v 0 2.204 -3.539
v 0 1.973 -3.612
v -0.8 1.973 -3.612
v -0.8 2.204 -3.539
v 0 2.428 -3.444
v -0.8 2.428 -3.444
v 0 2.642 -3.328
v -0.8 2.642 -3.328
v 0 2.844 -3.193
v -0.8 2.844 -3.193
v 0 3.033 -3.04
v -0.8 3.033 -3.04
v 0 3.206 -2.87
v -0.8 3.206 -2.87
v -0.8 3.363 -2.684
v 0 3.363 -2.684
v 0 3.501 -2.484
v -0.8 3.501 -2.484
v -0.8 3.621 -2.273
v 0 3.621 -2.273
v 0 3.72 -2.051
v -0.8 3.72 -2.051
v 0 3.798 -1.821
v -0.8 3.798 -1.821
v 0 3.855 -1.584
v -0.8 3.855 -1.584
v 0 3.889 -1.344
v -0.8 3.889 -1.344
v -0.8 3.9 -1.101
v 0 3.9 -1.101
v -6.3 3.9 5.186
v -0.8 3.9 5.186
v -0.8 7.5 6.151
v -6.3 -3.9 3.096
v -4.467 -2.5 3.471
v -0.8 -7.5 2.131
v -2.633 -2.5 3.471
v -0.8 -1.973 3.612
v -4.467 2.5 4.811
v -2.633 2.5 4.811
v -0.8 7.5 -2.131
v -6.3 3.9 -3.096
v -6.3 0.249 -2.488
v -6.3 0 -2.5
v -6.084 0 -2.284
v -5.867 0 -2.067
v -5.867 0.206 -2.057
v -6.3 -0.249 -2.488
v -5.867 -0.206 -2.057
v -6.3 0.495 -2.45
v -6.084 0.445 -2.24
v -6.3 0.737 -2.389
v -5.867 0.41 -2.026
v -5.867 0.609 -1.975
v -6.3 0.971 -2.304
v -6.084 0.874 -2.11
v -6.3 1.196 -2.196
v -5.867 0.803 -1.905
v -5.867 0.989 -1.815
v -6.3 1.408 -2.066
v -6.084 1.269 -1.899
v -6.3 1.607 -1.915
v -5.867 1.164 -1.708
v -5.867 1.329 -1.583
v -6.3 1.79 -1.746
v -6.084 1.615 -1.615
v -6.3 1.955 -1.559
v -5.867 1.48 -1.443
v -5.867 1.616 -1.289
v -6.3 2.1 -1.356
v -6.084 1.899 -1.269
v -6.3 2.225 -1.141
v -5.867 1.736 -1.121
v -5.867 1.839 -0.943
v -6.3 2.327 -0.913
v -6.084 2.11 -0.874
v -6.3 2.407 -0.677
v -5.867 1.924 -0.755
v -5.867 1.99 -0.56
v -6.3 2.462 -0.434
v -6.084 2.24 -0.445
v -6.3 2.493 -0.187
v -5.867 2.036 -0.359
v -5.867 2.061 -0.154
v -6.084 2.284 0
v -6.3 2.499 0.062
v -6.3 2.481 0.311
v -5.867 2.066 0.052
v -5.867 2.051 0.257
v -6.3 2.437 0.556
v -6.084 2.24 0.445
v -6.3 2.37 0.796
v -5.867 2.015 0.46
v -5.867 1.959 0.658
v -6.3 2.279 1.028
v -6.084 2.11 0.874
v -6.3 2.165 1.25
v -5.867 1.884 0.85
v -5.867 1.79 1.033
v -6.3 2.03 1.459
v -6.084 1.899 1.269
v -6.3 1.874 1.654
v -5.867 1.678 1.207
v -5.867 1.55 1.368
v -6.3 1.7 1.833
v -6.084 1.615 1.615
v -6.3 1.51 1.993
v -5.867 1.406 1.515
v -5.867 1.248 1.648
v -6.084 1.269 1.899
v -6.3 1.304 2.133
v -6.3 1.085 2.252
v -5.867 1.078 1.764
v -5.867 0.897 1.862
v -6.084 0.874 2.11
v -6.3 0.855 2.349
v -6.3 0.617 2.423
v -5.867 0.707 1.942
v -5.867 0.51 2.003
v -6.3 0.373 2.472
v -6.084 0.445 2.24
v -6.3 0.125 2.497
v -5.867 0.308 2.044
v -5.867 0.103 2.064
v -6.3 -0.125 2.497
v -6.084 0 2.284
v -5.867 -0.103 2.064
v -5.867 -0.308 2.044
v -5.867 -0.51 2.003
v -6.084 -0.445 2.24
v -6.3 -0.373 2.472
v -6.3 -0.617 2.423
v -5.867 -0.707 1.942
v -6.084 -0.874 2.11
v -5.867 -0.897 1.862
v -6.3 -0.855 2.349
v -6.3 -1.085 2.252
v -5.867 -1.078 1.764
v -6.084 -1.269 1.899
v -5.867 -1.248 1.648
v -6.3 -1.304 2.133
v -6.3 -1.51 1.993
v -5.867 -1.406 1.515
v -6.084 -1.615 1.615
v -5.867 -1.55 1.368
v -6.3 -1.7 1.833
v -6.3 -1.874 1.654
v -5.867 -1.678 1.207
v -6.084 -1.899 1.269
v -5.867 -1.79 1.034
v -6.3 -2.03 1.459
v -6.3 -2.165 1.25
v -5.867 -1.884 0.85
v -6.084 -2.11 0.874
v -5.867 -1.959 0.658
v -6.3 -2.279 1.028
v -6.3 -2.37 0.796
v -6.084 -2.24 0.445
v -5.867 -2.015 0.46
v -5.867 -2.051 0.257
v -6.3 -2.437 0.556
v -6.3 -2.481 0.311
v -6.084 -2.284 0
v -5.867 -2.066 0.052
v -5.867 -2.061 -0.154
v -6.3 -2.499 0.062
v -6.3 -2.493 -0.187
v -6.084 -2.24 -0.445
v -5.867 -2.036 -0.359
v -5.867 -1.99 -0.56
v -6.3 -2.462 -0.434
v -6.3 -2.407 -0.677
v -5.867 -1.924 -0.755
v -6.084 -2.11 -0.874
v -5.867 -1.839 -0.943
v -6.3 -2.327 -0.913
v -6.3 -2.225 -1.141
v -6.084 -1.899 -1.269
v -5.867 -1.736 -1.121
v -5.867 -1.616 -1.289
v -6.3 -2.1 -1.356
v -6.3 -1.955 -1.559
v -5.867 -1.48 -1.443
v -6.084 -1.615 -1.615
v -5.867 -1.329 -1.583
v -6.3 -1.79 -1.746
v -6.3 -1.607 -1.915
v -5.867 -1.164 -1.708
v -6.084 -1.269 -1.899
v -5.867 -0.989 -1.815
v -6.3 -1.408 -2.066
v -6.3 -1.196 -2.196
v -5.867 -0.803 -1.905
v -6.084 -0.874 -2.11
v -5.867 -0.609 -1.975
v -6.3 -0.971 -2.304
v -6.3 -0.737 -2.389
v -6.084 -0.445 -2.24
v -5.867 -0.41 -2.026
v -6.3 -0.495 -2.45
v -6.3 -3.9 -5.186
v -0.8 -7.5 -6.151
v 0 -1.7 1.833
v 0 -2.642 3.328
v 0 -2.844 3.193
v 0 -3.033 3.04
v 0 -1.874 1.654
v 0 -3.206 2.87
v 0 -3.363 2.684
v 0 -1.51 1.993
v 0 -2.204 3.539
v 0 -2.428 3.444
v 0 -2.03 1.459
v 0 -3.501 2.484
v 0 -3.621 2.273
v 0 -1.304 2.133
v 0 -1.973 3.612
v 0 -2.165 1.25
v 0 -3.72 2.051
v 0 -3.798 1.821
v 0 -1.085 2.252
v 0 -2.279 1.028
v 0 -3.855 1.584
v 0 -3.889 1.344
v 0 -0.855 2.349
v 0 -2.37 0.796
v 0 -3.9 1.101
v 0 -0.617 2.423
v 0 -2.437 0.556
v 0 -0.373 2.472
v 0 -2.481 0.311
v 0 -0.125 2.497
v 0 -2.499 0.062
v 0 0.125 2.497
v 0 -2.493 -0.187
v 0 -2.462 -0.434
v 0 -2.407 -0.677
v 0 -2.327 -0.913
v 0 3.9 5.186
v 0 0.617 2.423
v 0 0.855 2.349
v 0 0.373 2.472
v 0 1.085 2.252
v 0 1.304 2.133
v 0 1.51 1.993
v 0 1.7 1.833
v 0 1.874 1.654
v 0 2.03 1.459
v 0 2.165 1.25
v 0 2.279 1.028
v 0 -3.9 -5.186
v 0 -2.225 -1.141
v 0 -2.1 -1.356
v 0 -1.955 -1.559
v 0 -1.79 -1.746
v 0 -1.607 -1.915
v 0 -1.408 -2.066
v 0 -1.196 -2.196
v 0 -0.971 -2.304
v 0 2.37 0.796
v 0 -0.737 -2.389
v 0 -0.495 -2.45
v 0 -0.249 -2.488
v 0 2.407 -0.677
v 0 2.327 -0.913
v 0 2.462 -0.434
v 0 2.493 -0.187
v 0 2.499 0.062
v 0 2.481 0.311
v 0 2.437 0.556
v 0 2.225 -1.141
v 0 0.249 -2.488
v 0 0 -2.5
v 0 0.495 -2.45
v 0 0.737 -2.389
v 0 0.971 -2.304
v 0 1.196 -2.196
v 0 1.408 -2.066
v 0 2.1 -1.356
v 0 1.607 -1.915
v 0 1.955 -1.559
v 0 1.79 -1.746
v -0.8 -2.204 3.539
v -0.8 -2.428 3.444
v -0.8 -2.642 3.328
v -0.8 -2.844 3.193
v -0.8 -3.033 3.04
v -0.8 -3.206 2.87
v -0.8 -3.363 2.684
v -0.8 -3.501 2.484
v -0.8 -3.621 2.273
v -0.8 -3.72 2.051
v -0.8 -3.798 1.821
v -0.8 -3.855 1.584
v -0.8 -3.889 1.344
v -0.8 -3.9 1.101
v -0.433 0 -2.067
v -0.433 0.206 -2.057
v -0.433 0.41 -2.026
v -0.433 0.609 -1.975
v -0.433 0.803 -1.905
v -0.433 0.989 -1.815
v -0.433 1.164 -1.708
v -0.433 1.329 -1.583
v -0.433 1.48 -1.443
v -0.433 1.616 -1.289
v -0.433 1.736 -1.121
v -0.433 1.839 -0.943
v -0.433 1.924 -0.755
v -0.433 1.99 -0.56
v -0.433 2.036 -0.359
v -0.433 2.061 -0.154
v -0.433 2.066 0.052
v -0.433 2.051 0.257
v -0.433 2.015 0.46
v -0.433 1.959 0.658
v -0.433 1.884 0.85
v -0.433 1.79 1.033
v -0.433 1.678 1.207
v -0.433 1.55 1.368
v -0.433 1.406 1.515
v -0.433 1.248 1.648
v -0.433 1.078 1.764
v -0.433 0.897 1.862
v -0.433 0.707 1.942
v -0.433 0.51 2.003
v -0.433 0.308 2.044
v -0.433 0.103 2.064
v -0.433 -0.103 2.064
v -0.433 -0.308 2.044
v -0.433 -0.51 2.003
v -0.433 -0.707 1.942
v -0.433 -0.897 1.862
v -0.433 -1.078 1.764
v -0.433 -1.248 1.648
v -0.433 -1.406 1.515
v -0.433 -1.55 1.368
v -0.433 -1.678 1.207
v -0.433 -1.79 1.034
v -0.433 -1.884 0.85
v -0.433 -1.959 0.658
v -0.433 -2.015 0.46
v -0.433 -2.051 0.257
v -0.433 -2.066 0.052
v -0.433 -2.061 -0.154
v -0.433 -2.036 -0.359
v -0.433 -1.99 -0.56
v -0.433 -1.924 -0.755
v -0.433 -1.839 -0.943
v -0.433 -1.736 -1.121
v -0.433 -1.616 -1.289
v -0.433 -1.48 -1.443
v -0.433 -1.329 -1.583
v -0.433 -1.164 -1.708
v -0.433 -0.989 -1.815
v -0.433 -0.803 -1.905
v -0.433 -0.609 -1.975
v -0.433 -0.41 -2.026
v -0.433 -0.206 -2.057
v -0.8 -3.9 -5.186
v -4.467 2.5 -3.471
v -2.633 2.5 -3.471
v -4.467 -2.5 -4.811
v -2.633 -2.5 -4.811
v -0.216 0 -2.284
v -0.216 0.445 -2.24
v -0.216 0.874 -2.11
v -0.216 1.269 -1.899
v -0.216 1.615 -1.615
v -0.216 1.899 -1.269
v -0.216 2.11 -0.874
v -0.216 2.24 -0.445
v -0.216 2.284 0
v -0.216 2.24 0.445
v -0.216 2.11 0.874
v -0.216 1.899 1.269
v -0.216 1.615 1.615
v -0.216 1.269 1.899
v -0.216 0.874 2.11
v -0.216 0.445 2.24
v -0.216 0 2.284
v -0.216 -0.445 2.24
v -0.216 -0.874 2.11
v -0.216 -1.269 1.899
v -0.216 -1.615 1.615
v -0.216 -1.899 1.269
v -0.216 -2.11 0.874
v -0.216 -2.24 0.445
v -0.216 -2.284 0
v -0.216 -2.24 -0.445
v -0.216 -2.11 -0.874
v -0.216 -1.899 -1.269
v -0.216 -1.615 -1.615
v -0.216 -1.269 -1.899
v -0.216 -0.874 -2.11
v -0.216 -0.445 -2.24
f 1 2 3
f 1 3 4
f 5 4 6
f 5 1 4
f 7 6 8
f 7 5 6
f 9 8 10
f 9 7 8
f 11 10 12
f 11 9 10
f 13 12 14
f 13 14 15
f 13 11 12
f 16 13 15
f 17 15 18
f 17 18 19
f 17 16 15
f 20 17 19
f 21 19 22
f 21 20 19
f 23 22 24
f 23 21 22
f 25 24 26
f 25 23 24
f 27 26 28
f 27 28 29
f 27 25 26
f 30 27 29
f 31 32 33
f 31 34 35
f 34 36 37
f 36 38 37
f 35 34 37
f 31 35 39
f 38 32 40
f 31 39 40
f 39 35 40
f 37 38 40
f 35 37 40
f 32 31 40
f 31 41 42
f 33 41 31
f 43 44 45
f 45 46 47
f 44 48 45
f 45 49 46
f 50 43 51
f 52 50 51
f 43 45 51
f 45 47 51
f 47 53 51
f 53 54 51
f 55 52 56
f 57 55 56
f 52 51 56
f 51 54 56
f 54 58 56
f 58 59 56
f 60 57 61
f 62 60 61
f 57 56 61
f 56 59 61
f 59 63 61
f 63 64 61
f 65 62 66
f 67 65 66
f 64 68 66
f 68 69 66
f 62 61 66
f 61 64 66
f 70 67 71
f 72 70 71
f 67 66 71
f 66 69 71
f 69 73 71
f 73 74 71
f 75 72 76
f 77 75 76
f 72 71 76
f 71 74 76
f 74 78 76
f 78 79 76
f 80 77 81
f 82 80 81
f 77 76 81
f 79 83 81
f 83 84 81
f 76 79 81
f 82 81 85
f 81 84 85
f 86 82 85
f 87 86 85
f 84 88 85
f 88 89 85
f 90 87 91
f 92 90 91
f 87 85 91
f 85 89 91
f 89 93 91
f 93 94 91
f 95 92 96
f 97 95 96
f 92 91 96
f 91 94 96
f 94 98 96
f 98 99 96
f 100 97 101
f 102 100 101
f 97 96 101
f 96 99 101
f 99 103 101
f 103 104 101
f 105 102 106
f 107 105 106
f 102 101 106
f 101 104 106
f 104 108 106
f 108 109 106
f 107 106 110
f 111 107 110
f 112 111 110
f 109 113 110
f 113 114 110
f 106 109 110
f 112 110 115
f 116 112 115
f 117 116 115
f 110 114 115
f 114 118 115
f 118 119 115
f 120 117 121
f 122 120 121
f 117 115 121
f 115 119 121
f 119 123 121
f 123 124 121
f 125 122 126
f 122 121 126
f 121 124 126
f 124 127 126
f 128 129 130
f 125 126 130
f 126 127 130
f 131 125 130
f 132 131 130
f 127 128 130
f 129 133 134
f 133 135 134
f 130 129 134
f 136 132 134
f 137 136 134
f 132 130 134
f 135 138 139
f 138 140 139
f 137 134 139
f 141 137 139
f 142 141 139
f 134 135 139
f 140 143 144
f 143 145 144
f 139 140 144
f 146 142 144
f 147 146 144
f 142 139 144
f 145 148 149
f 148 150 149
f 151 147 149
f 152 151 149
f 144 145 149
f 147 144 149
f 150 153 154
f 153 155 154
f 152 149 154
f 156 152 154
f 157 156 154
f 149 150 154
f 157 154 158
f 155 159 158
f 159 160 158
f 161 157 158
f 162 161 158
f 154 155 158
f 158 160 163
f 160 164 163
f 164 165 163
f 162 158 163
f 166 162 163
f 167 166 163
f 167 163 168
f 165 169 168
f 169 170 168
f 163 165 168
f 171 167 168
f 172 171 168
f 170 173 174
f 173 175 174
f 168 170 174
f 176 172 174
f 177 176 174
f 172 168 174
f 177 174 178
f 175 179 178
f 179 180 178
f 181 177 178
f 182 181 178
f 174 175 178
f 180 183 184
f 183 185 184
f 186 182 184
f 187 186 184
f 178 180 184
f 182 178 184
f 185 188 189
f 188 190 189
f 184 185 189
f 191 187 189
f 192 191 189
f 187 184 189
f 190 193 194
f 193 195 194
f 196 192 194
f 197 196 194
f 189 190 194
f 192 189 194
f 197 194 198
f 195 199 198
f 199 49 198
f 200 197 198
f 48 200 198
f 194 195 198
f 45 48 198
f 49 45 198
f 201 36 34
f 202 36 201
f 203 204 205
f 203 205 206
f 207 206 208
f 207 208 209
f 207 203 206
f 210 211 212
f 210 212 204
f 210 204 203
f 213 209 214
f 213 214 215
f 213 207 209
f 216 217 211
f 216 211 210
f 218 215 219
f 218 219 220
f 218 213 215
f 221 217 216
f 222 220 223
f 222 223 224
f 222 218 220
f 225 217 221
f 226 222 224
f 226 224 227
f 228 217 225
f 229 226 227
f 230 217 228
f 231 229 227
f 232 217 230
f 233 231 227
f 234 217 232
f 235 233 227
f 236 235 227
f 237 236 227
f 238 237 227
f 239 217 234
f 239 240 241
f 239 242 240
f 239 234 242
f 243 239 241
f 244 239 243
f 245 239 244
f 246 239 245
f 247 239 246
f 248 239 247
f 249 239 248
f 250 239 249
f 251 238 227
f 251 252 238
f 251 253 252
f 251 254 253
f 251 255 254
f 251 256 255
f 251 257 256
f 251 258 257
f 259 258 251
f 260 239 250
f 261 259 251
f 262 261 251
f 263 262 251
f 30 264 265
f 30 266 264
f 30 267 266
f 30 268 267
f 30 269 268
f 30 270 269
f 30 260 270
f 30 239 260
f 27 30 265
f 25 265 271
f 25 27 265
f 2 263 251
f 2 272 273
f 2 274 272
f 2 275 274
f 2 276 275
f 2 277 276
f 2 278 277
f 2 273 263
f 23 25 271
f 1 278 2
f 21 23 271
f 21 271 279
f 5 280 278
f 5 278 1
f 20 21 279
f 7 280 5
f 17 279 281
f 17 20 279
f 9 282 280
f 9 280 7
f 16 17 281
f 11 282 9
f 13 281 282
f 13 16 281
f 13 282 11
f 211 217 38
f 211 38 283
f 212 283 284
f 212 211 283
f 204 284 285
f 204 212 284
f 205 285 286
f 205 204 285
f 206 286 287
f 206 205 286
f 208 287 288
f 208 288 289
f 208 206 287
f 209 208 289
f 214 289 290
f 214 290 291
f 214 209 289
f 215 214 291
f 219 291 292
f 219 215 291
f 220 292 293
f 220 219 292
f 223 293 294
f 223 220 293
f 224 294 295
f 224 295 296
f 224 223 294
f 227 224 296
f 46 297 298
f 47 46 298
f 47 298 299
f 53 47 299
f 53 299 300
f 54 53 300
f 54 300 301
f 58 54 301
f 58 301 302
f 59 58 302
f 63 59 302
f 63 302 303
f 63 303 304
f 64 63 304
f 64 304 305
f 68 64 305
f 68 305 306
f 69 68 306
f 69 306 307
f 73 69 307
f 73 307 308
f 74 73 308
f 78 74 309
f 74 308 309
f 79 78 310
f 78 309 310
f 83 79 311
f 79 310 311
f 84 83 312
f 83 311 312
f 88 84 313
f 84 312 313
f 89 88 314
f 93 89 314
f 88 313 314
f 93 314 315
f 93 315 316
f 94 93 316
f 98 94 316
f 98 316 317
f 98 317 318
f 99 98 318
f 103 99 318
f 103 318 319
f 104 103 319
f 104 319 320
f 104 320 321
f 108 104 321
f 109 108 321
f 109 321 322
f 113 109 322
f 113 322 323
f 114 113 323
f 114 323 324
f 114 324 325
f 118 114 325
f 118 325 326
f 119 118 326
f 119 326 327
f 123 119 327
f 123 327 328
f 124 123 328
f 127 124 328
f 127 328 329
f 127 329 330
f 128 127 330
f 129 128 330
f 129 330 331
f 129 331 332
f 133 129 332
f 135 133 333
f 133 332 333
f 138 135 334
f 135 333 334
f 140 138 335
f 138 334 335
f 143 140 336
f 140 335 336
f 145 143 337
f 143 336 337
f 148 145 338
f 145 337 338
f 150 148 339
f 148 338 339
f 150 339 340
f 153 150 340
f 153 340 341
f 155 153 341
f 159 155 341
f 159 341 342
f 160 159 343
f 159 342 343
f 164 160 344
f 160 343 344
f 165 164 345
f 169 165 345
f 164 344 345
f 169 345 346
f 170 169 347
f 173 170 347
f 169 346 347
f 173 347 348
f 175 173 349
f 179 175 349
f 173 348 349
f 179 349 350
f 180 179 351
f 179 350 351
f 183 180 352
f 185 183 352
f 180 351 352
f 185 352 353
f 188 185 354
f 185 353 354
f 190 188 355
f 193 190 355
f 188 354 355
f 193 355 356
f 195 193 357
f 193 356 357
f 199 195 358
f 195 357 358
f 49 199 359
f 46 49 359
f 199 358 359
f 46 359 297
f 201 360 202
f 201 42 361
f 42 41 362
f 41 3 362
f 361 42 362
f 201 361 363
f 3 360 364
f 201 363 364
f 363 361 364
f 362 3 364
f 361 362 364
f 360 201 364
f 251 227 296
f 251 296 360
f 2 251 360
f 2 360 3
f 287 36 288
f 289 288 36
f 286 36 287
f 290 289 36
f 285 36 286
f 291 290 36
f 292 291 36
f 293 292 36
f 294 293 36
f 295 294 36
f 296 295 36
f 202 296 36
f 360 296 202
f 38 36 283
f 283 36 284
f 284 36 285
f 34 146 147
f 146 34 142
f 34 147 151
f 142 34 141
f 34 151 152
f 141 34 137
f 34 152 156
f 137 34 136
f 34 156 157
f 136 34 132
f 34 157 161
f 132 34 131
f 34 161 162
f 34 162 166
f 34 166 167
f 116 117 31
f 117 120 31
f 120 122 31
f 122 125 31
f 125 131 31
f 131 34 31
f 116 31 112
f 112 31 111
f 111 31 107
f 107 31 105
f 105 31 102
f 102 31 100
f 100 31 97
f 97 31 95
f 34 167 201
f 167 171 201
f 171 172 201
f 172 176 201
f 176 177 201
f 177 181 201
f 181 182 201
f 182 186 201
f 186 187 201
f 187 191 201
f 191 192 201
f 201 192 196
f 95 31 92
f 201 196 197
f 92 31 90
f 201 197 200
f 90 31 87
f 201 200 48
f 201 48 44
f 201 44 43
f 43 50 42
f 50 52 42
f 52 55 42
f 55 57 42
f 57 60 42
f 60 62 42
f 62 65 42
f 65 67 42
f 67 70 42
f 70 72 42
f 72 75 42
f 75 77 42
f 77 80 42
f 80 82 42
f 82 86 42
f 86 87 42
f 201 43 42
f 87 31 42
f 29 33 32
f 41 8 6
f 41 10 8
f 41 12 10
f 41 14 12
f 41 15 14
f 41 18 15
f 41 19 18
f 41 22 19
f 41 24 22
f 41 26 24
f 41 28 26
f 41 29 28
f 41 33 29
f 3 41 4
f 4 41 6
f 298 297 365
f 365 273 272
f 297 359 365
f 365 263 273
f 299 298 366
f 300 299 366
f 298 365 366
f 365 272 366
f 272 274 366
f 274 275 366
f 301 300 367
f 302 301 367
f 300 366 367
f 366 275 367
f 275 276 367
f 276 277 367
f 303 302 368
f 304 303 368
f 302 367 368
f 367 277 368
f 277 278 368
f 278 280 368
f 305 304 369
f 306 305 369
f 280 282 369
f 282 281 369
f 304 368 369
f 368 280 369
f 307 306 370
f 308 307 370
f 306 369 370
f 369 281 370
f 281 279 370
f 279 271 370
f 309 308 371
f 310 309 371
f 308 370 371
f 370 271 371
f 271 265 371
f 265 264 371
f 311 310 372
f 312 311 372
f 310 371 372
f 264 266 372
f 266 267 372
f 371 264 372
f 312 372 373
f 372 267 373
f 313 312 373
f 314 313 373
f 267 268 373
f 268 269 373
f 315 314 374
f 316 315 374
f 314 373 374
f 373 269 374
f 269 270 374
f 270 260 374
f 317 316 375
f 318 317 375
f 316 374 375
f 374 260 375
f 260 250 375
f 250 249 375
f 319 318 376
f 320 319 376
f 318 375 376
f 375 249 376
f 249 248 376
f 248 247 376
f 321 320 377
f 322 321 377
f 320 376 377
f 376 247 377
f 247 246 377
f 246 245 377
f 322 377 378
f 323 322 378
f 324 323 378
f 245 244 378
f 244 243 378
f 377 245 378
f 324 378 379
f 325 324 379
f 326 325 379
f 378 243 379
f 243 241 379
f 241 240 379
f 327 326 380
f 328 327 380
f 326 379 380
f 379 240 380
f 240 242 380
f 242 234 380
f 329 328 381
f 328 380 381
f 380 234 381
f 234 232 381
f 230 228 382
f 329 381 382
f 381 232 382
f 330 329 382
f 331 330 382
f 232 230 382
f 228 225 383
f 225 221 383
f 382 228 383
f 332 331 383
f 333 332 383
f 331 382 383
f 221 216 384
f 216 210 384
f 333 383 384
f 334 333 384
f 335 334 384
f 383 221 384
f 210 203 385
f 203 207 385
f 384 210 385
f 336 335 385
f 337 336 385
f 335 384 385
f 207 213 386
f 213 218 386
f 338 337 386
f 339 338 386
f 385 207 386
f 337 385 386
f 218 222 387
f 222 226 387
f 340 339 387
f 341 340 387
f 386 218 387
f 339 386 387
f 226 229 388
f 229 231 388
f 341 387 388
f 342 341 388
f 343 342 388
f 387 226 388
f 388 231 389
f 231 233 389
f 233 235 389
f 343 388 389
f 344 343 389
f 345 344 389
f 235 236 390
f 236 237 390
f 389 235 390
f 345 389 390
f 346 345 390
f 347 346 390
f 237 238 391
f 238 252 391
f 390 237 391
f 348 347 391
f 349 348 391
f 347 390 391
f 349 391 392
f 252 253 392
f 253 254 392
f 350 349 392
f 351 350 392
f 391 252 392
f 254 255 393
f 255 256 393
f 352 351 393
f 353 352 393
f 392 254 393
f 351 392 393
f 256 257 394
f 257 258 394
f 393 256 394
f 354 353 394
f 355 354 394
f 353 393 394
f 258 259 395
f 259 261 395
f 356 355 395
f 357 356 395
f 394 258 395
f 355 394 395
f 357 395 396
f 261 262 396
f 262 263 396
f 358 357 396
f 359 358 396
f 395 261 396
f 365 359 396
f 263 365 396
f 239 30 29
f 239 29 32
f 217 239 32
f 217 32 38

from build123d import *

# Parameters (mm, degrees)
EXTRUDE1_DEPTH = 0.8
EXTRUDE2_DEPTH = 5.5
DRAFT1_ANGLE   = -33.206570315
DRAFT2_ANGLE   = -33.206570315
HOLEWZD1_D     = 4.134
HOLEWZD1_DEPTH = 6.300025
CHAMFER1_SIZE  = 0.433


with BuildPart() as part:
    # Sketch1 → Extrude1 (new body)
    with BuildSketch(Plane(origin=(0, 0, 0), x_dir=(0, 0, -1), z_dir=(1, 0, 0))):
        with BuildLine():
            Line((1.101052702, 3.9), (-5.186106572, 3.9))
            Line((-5.186106572, 3.9), (-3.612459851, -1.972929517))
            ThreePointArc((-3.612459851, -1.972929517), (-2.683832418, -3.362718685), (-1.101052702, -3.9))
            Line((-1.101052702, -3.9), (5.186106572, -3.9))
            Line((5.186106572, -3.9), (3.612459851, 1.972929517))
            ThreePointArc((3.612459851, 1.972929517), (2.683832418, 3.362718685), (1.101052702, 3.9))
        make_face()
    extrude(amount=-EXTRUDE1_DEPTH)

    # Sketch2 → Extrude2 (add)
    with BuildSketch(Plane.ZY.offset(0.8)):
        with BuildLine():
            Line((2.131485778, -7.5), (-6.150723665, -7.5))
            add(Edge.make_bspline(
                [(-2.131485778, 7.5), (-3.471231741, 2.5), (-4.810977703, -2.5), (-6.150723665, -7.5)],
                knots=[0, 0, 0, 0, 1, 1, 1, 1], degree=3))
            Line((-2.131485778, 7.5), (6.150723665, 7.5))
            add(Edge.make_bspline(
                [(2.131485778, -7.5), (3.471231741, -2.5), (4.810977703, 2.5), (6.150723665, 7.5)],
                knots=[0, 0, 0, 0, 1, 1, 1, 1], degree=3))
        make_face()
    extrude(amount=EXTRUDE2_DEPTH)

    # Draft1
    draft1_faces = [part.faces().sort_by_distance(p)[0] for p in [
        (-3.55, 7.5, 2.009618943),
    ]]
    draft(draft1_faces, Plane(origin=(-0.8, 0, 4.141104722), x_dir=(0, 0, 1), z_dir=(1, 0, 0)), DRAFT1_ANGLE)

    # Draft2
    draft2_faces = [part.faces().sort_by_distance(p)[0] for p in [
        (-3.55, -7.5, -2.009618943),
    ]]
    draft(draft2_faces, Plane(origin=(-0.8, 0, 4.141104722), x_dir=(0, 0, 1), z_dir=(1, 0, 0)), DRAFT2_ANGLE)

    # HoleWzd1
    with Locations(Plane.ZY.offset(6.3)):
        with Locations((0, 0)):
            Hole(HOLEWZD1_D / 2, depth=HOLEWZD1_DEPTH)

    # Chamfer1
    chamfer1_edges = [part.edges().sort_by_distance(p)[0] for p in [
        (0, 0, 2.067),
        (-6.3, 0, 2.067),
    ]]
    chamfer(chamfer1_edges, length=CHAMFER1_SIZE)


solid = part.part
